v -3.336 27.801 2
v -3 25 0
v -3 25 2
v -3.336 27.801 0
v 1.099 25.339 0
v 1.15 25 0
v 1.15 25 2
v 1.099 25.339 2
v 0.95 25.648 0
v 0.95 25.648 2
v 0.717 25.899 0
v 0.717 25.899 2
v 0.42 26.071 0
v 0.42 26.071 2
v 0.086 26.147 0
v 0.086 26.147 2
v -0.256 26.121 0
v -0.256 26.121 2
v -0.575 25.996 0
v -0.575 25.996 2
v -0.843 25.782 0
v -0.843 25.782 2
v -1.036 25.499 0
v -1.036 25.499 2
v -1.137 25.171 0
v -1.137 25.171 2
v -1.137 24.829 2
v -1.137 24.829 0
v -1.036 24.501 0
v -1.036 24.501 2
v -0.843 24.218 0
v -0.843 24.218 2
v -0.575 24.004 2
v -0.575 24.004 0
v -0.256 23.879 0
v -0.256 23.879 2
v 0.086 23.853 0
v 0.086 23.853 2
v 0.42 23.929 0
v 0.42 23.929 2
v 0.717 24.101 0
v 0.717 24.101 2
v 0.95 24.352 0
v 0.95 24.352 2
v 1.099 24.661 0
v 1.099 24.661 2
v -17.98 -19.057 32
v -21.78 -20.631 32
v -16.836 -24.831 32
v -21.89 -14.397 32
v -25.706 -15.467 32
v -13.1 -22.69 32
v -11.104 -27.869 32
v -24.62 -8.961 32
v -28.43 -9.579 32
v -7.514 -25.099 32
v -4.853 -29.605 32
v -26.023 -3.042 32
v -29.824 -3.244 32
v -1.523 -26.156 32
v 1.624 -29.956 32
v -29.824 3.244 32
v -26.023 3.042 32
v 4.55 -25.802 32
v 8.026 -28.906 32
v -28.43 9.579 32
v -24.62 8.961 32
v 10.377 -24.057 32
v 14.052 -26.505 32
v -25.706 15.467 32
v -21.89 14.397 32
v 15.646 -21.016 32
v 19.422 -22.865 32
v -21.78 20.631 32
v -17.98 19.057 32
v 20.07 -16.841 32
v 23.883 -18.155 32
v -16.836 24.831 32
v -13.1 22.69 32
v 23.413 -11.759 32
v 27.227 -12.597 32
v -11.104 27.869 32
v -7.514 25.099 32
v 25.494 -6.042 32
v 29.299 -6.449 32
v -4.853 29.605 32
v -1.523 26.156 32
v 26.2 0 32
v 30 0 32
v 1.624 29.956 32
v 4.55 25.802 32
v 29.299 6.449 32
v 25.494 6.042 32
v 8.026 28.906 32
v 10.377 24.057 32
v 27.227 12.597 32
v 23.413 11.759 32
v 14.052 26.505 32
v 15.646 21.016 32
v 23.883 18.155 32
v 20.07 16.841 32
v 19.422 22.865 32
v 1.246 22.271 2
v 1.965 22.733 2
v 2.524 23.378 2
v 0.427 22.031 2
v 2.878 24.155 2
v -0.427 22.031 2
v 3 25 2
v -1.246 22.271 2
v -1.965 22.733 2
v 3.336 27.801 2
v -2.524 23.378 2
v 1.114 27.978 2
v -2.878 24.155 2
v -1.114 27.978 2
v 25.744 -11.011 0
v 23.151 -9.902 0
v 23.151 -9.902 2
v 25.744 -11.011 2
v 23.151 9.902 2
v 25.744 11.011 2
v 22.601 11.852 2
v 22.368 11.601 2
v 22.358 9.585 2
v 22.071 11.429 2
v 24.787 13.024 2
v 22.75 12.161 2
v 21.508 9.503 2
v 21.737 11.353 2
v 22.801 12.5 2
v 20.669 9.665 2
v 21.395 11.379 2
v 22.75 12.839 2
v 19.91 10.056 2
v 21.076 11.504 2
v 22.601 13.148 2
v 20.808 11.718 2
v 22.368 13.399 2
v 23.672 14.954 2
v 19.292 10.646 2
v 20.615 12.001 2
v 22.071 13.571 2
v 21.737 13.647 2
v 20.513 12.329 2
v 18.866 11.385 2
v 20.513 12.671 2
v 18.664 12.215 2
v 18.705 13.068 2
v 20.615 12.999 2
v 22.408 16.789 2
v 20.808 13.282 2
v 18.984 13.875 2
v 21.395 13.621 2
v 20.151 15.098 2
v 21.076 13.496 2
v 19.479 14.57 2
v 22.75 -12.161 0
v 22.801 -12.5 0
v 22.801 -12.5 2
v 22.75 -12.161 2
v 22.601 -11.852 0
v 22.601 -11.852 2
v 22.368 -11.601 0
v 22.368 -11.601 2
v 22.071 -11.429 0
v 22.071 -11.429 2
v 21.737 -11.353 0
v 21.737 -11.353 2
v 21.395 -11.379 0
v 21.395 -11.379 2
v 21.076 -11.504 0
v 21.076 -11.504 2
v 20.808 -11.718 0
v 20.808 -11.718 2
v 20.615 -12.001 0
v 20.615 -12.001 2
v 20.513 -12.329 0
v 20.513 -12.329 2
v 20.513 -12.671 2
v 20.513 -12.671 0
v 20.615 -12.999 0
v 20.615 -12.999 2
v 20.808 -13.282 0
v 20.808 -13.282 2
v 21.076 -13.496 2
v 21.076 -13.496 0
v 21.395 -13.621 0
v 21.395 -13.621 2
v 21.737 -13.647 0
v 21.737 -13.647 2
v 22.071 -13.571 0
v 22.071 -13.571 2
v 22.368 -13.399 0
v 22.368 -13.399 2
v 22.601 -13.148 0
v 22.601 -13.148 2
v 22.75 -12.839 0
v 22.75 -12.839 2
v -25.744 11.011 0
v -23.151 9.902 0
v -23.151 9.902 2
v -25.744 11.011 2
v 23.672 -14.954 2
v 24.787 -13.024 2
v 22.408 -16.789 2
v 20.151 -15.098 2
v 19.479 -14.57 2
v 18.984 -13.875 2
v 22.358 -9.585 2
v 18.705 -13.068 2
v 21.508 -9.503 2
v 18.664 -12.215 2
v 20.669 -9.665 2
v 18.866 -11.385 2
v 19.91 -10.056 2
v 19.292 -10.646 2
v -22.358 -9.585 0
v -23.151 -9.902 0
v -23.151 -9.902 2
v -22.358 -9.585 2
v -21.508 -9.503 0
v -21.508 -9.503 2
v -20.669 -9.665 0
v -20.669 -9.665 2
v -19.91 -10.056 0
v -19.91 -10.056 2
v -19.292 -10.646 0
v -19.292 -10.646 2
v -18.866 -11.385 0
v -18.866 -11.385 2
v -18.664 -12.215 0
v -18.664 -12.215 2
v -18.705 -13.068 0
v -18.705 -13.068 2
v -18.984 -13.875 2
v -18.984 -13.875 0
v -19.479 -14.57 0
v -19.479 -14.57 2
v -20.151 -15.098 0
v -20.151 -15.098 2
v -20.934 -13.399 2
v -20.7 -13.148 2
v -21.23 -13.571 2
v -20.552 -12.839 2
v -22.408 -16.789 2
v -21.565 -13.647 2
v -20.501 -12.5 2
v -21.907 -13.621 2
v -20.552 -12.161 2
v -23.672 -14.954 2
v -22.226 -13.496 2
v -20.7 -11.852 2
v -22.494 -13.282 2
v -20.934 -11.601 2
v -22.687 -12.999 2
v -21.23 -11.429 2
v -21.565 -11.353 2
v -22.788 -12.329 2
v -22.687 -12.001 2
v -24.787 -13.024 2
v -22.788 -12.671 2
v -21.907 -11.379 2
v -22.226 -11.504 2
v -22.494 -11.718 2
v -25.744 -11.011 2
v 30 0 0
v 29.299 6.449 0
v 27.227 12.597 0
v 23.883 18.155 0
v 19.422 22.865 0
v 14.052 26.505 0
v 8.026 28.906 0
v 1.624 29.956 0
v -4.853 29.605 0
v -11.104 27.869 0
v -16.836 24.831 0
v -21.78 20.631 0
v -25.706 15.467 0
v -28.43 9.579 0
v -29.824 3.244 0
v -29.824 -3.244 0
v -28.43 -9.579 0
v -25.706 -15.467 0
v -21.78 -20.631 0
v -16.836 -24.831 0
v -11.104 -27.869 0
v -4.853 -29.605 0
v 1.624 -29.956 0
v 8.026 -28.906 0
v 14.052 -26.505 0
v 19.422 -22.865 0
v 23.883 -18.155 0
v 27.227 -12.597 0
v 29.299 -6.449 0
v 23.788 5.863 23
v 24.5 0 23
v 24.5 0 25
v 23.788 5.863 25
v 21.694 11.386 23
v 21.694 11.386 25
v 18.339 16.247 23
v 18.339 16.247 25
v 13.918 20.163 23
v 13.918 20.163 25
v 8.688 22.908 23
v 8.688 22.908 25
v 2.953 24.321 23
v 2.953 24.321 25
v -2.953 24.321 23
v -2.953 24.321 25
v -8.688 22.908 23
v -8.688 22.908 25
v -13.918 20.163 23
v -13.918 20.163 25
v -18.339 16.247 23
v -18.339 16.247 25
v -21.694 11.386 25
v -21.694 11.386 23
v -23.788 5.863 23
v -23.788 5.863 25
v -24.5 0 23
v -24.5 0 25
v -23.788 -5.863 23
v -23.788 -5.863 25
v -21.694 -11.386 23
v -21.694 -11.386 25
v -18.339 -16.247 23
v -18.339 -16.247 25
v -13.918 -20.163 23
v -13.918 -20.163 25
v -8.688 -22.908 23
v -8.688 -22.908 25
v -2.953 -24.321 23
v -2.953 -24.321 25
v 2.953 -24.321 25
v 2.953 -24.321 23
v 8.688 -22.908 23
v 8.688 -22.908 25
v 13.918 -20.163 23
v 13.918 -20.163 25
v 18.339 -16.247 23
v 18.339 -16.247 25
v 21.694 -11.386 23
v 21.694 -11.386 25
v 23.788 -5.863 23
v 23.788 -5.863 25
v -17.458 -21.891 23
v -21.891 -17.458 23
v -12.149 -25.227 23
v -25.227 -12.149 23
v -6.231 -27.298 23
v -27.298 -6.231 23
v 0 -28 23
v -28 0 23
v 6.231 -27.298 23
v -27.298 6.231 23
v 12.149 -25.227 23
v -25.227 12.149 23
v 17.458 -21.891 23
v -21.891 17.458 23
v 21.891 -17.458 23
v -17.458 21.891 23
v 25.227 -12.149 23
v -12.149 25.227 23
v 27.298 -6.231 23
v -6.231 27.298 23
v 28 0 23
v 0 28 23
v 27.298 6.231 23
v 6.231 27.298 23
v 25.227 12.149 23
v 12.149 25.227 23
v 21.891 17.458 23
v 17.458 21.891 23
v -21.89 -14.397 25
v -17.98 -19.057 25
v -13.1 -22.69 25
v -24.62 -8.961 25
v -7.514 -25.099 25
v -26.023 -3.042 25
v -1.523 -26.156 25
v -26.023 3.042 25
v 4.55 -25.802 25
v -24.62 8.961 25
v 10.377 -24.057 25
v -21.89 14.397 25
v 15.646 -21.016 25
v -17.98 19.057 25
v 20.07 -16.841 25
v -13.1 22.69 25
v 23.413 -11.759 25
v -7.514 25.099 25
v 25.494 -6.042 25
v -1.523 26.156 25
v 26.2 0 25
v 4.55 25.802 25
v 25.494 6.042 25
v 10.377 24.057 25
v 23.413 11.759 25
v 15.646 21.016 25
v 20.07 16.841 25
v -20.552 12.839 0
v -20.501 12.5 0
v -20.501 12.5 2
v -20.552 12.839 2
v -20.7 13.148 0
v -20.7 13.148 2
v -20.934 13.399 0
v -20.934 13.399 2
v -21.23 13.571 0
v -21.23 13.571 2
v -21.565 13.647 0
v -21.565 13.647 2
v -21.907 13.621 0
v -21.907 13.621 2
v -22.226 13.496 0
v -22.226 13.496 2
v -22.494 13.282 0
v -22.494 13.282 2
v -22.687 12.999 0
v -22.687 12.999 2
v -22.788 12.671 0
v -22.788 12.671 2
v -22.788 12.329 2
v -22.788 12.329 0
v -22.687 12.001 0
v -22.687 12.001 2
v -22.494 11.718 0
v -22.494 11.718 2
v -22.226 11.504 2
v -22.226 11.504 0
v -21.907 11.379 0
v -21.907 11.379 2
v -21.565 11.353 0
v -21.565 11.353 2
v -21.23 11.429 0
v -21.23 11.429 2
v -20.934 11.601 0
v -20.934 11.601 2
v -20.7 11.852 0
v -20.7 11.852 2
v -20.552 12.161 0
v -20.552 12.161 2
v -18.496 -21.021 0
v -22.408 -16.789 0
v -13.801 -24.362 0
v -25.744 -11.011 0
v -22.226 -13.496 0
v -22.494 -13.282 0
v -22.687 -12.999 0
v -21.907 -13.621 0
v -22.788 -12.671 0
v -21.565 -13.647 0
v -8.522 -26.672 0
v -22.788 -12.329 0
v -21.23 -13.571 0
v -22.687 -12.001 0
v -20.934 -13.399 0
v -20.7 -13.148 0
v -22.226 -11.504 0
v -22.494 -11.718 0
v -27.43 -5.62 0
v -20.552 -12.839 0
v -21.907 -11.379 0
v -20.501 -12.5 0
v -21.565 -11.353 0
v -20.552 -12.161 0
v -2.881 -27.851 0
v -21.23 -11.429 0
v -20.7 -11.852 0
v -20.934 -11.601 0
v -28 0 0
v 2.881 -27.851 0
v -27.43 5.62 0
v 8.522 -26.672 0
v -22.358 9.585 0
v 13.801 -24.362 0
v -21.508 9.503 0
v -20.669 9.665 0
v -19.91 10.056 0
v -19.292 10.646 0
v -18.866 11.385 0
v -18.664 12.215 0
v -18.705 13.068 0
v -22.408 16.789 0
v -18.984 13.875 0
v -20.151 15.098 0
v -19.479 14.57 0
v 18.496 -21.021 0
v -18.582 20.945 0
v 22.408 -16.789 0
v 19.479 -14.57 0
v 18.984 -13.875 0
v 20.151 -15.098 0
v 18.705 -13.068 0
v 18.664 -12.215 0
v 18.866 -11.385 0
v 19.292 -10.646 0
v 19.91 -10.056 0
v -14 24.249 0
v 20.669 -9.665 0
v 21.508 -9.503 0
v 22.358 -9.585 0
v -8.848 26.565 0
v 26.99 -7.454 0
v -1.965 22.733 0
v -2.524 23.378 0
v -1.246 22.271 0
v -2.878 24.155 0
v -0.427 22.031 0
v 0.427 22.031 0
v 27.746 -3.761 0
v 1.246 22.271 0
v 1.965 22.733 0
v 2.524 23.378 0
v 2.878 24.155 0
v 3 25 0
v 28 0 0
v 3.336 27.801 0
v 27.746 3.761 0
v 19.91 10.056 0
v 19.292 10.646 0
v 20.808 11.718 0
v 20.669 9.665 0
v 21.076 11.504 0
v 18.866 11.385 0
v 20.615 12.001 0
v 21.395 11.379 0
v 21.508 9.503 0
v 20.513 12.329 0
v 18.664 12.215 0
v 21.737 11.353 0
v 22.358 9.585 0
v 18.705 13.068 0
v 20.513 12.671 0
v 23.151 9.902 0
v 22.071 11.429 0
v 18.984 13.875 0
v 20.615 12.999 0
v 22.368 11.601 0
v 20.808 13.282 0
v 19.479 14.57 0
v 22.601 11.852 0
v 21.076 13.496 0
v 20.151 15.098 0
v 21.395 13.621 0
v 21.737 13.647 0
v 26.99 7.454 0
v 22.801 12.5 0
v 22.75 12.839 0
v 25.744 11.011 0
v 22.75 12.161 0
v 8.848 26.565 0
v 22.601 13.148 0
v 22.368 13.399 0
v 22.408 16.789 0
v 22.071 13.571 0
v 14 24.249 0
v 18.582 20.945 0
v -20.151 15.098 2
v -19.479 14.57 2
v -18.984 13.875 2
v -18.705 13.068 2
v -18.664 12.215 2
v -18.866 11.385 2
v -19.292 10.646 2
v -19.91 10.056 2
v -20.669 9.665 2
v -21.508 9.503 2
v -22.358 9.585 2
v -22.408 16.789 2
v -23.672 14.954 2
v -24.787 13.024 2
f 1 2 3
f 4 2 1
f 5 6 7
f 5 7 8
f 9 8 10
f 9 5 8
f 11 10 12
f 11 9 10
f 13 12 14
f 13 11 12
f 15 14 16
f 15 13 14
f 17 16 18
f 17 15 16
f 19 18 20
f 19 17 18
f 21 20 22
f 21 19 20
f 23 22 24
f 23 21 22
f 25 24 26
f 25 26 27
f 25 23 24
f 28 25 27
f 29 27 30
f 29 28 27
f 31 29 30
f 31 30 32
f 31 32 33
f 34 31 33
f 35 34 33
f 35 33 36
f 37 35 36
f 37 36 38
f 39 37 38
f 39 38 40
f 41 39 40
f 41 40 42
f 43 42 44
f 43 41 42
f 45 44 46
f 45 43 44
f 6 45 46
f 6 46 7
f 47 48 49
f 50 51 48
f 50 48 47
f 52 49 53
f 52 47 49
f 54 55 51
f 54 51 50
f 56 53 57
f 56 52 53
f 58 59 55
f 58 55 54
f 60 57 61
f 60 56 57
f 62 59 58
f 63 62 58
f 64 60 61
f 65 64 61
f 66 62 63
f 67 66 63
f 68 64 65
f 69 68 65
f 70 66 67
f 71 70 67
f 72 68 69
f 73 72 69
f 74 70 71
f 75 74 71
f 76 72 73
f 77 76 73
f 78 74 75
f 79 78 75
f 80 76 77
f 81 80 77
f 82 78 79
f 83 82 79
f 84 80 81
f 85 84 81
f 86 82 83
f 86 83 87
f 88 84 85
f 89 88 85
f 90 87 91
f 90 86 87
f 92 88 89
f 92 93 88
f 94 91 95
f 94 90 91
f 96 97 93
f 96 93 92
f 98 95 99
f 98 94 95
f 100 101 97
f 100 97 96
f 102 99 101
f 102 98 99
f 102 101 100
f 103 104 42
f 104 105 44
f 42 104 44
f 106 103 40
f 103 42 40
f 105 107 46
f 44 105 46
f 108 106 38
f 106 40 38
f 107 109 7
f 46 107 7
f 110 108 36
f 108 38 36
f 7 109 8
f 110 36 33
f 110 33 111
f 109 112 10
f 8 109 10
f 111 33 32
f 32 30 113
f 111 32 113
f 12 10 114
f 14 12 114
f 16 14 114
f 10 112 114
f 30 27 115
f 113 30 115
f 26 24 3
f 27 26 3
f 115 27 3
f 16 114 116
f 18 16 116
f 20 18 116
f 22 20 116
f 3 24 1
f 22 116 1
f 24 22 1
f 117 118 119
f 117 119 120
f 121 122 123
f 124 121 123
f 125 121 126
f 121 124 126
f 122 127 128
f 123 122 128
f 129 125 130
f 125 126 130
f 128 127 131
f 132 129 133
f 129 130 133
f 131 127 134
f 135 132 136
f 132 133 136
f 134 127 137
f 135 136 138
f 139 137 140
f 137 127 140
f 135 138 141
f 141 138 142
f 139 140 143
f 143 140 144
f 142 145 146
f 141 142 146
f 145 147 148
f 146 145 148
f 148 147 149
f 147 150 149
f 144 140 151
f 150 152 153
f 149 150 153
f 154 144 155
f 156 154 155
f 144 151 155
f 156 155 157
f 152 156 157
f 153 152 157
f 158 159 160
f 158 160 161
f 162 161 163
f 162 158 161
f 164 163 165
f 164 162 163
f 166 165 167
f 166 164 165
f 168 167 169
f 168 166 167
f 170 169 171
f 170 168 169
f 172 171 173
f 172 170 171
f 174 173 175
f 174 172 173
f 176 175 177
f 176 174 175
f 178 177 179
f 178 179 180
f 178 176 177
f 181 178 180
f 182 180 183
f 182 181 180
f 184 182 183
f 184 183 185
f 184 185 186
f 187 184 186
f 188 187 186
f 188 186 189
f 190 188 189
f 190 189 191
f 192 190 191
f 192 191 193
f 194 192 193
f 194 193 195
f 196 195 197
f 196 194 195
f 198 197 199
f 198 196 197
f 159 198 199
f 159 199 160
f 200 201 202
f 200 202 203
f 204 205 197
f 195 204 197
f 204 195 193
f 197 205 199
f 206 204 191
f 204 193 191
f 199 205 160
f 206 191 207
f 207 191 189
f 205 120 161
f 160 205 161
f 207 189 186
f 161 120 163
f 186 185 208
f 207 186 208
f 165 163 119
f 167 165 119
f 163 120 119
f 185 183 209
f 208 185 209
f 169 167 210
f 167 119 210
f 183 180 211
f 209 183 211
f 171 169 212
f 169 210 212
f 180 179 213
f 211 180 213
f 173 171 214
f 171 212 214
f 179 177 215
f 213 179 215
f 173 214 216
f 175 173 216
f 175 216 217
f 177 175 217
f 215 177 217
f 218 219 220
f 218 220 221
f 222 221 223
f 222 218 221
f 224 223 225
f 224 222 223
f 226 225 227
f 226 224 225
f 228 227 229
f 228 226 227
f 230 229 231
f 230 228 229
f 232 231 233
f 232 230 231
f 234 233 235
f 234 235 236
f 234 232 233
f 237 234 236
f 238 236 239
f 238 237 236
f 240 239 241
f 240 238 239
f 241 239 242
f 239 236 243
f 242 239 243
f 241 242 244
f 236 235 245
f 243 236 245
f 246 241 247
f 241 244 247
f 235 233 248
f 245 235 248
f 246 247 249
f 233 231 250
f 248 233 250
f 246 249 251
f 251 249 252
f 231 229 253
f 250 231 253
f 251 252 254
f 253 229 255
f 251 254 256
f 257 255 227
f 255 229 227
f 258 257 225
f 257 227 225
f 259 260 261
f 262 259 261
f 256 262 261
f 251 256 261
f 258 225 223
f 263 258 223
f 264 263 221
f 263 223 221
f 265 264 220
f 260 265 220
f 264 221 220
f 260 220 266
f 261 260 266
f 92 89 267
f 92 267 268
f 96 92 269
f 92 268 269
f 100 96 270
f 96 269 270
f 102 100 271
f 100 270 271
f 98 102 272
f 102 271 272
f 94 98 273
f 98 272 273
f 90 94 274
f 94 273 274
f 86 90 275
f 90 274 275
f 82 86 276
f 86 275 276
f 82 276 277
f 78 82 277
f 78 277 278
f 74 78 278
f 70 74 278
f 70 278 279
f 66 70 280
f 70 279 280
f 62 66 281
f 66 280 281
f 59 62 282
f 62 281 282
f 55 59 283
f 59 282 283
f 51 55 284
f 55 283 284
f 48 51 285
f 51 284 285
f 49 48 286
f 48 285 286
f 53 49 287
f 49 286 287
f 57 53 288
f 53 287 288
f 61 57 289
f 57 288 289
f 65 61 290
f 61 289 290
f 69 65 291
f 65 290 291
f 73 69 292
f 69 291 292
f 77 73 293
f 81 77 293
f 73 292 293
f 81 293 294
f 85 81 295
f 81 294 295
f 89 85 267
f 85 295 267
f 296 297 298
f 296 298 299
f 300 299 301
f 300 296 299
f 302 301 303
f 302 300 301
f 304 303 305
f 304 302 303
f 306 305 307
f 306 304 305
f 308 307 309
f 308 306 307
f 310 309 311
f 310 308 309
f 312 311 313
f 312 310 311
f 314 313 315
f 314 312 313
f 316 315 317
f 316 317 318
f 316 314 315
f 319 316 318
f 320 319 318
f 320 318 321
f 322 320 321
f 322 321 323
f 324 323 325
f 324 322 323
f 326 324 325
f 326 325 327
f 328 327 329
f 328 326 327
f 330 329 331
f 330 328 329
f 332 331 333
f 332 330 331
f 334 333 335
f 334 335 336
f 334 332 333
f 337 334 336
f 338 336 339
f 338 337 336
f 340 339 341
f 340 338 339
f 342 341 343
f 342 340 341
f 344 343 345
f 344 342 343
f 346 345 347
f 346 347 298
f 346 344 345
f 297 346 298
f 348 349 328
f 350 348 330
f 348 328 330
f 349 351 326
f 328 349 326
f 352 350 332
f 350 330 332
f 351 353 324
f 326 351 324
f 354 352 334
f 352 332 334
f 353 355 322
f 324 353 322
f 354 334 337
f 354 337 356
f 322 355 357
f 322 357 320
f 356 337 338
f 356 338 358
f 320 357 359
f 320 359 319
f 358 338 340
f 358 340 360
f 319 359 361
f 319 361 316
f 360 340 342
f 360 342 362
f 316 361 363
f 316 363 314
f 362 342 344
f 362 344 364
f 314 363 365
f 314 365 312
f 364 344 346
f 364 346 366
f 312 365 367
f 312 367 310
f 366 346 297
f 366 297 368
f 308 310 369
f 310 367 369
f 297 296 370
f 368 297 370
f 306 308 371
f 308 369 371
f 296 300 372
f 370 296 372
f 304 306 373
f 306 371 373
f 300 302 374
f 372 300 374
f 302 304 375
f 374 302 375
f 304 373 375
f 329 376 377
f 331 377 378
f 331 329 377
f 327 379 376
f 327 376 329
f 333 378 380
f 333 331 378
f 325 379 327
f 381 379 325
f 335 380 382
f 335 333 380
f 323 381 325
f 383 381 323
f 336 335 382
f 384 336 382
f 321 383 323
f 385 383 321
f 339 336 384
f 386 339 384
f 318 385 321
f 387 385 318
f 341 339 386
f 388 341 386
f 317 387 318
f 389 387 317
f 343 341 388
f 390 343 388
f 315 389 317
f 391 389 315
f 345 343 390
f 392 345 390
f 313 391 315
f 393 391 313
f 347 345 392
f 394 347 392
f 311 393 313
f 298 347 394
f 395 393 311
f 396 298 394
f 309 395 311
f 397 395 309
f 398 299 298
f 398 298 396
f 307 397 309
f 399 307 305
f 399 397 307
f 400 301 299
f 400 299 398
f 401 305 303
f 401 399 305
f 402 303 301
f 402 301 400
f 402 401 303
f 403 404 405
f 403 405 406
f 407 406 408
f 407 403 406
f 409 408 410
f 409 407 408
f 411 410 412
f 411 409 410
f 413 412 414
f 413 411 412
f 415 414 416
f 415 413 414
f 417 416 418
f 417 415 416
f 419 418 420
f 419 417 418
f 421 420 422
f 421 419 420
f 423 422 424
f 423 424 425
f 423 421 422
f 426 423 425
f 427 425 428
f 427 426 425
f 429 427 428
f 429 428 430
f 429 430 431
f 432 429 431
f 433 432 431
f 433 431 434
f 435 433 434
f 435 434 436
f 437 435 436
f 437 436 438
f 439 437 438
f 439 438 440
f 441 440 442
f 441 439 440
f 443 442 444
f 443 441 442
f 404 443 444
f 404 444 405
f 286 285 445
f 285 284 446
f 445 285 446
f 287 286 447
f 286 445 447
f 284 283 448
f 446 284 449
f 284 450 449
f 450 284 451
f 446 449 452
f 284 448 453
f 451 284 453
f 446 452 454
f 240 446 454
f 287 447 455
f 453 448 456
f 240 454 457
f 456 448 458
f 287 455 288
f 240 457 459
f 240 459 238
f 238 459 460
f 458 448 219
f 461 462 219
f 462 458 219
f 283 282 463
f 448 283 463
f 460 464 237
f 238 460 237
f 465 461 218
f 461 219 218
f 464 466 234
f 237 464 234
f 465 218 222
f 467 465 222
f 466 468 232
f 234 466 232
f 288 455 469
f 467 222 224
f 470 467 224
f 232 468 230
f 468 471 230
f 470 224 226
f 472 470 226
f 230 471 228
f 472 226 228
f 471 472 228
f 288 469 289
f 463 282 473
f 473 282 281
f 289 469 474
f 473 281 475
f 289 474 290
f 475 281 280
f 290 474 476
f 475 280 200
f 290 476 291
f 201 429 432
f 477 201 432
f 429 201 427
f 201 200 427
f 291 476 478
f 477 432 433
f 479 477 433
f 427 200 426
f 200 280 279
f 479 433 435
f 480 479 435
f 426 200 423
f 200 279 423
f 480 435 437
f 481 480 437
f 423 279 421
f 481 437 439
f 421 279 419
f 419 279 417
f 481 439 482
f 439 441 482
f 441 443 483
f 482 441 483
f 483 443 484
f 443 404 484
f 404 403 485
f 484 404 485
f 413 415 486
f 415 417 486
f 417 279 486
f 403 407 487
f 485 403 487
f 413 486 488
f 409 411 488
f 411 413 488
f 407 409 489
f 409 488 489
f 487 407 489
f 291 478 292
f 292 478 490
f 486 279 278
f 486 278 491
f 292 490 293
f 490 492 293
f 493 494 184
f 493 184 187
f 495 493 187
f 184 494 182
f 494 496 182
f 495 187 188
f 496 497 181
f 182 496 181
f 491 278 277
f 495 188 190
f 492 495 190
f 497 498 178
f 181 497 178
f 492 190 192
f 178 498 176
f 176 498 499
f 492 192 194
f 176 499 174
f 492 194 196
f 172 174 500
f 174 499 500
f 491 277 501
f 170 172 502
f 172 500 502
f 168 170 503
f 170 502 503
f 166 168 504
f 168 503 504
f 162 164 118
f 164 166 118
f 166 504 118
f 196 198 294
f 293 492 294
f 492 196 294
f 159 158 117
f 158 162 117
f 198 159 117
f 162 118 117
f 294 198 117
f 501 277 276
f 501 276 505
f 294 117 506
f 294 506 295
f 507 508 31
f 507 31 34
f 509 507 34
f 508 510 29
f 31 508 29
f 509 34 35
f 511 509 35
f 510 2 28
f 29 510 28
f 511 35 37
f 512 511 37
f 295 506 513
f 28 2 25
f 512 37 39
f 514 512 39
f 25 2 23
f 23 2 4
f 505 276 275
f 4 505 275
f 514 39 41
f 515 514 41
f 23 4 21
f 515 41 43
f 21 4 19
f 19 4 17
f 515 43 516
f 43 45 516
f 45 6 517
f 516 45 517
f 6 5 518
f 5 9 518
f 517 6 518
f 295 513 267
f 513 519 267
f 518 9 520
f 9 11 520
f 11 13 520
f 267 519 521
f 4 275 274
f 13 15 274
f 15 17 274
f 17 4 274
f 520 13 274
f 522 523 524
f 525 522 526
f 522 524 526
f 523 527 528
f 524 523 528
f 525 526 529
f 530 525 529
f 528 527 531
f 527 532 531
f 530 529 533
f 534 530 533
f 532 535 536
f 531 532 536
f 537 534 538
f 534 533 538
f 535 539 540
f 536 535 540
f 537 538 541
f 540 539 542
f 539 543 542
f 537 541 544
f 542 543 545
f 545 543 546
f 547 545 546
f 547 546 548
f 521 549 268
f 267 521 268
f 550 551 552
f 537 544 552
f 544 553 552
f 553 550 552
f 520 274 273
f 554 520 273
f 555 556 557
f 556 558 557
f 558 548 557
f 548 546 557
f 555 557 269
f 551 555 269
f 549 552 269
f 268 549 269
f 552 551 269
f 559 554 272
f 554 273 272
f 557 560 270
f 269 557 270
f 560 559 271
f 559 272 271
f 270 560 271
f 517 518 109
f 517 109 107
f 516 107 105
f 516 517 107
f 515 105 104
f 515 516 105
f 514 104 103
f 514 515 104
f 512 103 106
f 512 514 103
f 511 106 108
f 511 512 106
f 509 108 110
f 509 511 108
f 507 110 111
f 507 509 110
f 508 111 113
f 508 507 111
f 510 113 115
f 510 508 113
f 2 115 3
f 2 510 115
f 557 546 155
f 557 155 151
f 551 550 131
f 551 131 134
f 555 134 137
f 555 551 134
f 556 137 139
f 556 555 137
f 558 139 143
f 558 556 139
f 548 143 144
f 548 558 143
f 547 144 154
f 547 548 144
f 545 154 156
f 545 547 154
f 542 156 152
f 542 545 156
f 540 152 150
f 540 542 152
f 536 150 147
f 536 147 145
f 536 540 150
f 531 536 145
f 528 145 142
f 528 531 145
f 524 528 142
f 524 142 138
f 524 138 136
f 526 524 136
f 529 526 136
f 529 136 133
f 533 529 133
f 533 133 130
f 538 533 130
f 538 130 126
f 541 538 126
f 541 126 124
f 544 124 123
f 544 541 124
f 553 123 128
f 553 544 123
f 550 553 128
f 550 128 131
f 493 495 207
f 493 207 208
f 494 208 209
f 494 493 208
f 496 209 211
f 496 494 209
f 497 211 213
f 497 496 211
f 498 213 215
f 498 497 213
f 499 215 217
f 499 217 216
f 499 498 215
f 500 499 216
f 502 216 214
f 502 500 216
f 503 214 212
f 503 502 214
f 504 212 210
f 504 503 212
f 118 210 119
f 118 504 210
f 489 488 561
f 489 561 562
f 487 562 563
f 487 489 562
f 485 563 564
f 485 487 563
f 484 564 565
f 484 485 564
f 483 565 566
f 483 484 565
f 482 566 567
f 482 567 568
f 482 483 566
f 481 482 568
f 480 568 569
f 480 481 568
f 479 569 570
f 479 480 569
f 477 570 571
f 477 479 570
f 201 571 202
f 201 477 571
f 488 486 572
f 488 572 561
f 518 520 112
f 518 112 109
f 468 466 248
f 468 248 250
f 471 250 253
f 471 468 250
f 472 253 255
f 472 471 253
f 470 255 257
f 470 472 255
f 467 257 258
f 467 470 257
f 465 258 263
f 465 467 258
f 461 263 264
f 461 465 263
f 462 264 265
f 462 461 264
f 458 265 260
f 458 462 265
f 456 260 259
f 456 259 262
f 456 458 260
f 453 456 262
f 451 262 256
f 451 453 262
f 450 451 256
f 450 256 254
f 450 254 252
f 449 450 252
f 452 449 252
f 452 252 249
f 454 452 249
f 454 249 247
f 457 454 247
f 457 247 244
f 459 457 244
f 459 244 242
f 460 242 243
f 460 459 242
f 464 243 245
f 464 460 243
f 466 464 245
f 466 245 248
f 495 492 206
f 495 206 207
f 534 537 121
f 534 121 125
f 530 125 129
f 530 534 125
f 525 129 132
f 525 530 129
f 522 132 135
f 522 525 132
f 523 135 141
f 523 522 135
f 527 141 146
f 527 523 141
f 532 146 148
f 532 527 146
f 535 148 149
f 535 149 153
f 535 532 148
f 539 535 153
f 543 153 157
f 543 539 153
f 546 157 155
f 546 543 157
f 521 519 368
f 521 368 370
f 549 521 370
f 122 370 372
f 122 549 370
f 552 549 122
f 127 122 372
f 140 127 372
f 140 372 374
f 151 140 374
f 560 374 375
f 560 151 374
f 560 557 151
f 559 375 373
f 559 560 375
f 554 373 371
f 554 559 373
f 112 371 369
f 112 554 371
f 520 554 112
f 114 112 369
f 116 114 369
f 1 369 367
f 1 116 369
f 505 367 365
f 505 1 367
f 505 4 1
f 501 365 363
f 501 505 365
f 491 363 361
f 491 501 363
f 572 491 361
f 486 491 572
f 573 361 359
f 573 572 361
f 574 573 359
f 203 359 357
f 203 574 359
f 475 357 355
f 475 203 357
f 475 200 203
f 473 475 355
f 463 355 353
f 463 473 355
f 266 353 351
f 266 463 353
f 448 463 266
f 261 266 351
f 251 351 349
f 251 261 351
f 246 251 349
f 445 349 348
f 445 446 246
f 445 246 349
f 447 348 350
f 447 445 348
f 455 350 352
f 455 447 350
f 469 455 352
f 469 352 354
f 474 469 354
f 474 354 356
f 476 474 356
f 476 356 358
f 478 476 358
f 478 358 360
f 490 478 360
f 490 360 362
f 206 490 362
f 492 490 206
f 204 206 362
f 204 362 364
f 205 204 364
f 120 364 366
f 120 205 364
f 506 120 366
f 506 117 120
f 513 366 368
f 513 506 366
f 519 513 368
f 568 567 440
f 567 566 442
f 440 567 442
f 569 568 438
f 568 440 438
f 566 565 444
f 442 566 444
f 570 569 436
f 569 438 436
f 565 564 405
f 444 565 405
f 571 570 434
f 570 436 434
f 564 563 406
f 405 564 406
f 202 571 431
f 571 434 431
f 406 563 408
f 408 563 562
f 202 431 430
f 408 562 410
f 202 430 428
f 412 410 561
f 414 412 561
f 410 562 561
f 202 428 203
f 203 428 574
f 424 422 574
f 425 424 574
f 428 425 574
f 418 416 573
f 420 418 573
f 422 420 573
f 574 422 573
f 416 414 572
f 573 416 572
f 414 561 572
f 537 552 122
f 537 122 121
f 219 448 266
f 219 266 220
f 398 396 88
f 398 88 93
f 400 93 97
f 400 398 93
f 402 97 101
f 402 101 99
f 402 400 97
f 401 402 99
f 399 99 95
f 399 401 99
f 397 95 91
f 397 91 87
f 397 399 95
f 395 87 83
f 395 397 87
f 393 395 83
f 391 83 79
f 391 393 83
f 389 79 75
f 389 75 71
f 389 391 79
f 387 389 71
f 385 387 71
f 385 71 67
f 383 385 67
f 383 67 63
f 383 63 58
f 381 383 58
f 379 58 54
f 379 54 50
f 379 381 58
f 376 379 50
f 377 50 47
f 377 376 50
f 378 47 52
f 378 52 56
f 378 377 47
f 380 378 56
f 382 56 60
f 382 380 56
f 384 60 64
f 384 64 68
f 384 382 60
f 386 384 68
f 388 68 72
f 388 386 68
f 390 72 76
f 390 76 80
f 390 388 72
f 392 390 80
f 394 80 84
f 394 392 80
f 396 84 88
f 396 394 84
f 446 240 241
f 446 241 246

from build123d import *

# Parameters (mm, degrees)
CROQUIS1_R              = 30
CROQUIS1_R_2            = 28
SALIENTE_EXTRUIR1_DEPTH = 23
CROQUIS2_R              = 1.15
SALIENTE_EXTRUIR2_DEPTH = 2
CROQUIS4_R              = 30
CROQUIS4_R_2            = 24.5
SALIENTE_EXTRUIR3_DEPTH = 2
CROQUIS5_R              = 30
CROQUIS5_R_2            = 26.2
SALIENTE_EXTRUIR4_DEPTH = 7


with BuildPart() as part:
    # Croquis1 → Saliente-Extruir1 (new body)
    with BuildSketch(Plane.XY):
        Circle(CROQUIS1_R)
        Circle(CROQUIS1_R_2, mode=Mode.SUBTRACT)
    extrude(amount=SALIENTE_EXTRUIR1_DEPTH)

    # Croquis2 → Saliente-Extruir2 (add)
    # profile 1 of 5: a face of its own
    with BuildSketch(Plane.XY):
        with BuildLine():
            Line((-3, 25), (-3.336066177, 27.800551478))
            ThreePointArc((-3.336066177, 27.800551478), (0, 28), (3.336066177, 27.800551478))
            Line((3.336066177, 27.800551478), (3, 25))
            ThreePointArc((3, 25), (0, 22), (-3, 25))
        make_face()
        with Locations((0, 25)):
            Circle(CROQUIS2_R, mode=Mode.SUBTRACT)
    # profile 2 of 5: a face of its own
    with BuildSketch(Plane.XY):
        with BuildLine():
            Line((20.150635095, 15.098076211), (22.40795073, 16.789393797))
            ThreePointArc((22.40795073, 16.789393797), (24.248711306, 14), (25.744016908, 11.011157681))
            Line((25.744016908, 11.011157681), (23.150635095, 9.901923789))
            ThreePointArc((23.150635095, 9.901923789), (19.052558883, 11), (20.150635095, 15.098076211))
        make_face()
        with Locations((21.650635095, 12.5)):
            Circle(CROQUIS2_R, mode=Mode.SUBTRACT)
    # profile 3 of 5: a face of its own
    with BuildSketch(Plane.XY):
        with BuildLine():
            Line((23.150635095, -9.901923789), (25.744016908, -11.011157681))
            ThreePointArc((25.744016908, -11.011157681), (24.248711306, -14), (22.40795073, -16.789393797))
            Line((22.40795073, -16.789393797), (20.150635095, -15.098076211))
            ThreePointArc((20.150635095, -15.098076211), (19.052558883, -11), (23.150635095, -9.901923789))
        make_face()
        with Locations((21.650635095, -12.5)):
            Circle(CROQUIS2_R, mode=Mode.SUBTRACT)
    # profile 4 of 5: a face of its own
    with BuildSketch(Plane.XY):
        with BuildLine():
            Line((-20.150635095, -15.098076211), (-22.40795073, -16.789393797))
            ThreePointArc((-22.40795073, -16.789393797), (-24.248711306, -14), (-25.744016908, -11.011157681))
            Line((-25.744016908, -11.011157681), (-23.150635095, -9.901923789))
            ThreePointArc((-23.150635095, -9.901923789), (-19.052558883, -11), (-20.150635095, -15.098076211))
        make_face()
        with Locations((-21.650635095, -12.5)):
            Circle(CROQUIS2_R, mode=Mode.SUBTRACT)
    # profile 5 of 5: a face of its own
    with BuildSketch(Plane.XY):
        with BuildLine():
            Line((-23.150635095, 9.901923789), (-25.744016908, 11.011157681))
            ThreePointArc((-25.744016908, 11.011157681), (-24.248711306, 14), (-22.40795073, 16.789393797))
            Line((-22.40795073, 16.789393797), (-20.150635095, 15.098076211))
            ThreePointArc((-20.150635095, 15.098076211), (-19.052558883, 11), (-23.150635095, 9.901923789))
        make_face()
        with Locations((-21.650635095, 12.5)):
            Circle(CROQUIS2_R, mode=Mode.SUBTRACT)
    extrude(amount=SALIENTE_EXTRUIR2_DEPTH)

    # Croquis4 → Saliente-Extruir3 (add)
    with BuildSketch(Plane.XY.offset(23)):
        Circle(CROQUIS4_R)
        Circle(CROQUIS4_R_2, mode=Mode.SUBTRACT)
    extrude(amount=SALIENTE_EXTRUIR3_DEPTH)

    # Croquis5 → Saliente-Extruir4 (add)
    with BuildSketch(Plane.XY.offset(25)):
        Circle(CROQUIS5_R)
        Circle(CROQUIS5_R_2, mode=Mode.SUBTRACT)
    extrude(amount=SALIENTE_EXTRUIR4_DEPTH)


solid = part.part
